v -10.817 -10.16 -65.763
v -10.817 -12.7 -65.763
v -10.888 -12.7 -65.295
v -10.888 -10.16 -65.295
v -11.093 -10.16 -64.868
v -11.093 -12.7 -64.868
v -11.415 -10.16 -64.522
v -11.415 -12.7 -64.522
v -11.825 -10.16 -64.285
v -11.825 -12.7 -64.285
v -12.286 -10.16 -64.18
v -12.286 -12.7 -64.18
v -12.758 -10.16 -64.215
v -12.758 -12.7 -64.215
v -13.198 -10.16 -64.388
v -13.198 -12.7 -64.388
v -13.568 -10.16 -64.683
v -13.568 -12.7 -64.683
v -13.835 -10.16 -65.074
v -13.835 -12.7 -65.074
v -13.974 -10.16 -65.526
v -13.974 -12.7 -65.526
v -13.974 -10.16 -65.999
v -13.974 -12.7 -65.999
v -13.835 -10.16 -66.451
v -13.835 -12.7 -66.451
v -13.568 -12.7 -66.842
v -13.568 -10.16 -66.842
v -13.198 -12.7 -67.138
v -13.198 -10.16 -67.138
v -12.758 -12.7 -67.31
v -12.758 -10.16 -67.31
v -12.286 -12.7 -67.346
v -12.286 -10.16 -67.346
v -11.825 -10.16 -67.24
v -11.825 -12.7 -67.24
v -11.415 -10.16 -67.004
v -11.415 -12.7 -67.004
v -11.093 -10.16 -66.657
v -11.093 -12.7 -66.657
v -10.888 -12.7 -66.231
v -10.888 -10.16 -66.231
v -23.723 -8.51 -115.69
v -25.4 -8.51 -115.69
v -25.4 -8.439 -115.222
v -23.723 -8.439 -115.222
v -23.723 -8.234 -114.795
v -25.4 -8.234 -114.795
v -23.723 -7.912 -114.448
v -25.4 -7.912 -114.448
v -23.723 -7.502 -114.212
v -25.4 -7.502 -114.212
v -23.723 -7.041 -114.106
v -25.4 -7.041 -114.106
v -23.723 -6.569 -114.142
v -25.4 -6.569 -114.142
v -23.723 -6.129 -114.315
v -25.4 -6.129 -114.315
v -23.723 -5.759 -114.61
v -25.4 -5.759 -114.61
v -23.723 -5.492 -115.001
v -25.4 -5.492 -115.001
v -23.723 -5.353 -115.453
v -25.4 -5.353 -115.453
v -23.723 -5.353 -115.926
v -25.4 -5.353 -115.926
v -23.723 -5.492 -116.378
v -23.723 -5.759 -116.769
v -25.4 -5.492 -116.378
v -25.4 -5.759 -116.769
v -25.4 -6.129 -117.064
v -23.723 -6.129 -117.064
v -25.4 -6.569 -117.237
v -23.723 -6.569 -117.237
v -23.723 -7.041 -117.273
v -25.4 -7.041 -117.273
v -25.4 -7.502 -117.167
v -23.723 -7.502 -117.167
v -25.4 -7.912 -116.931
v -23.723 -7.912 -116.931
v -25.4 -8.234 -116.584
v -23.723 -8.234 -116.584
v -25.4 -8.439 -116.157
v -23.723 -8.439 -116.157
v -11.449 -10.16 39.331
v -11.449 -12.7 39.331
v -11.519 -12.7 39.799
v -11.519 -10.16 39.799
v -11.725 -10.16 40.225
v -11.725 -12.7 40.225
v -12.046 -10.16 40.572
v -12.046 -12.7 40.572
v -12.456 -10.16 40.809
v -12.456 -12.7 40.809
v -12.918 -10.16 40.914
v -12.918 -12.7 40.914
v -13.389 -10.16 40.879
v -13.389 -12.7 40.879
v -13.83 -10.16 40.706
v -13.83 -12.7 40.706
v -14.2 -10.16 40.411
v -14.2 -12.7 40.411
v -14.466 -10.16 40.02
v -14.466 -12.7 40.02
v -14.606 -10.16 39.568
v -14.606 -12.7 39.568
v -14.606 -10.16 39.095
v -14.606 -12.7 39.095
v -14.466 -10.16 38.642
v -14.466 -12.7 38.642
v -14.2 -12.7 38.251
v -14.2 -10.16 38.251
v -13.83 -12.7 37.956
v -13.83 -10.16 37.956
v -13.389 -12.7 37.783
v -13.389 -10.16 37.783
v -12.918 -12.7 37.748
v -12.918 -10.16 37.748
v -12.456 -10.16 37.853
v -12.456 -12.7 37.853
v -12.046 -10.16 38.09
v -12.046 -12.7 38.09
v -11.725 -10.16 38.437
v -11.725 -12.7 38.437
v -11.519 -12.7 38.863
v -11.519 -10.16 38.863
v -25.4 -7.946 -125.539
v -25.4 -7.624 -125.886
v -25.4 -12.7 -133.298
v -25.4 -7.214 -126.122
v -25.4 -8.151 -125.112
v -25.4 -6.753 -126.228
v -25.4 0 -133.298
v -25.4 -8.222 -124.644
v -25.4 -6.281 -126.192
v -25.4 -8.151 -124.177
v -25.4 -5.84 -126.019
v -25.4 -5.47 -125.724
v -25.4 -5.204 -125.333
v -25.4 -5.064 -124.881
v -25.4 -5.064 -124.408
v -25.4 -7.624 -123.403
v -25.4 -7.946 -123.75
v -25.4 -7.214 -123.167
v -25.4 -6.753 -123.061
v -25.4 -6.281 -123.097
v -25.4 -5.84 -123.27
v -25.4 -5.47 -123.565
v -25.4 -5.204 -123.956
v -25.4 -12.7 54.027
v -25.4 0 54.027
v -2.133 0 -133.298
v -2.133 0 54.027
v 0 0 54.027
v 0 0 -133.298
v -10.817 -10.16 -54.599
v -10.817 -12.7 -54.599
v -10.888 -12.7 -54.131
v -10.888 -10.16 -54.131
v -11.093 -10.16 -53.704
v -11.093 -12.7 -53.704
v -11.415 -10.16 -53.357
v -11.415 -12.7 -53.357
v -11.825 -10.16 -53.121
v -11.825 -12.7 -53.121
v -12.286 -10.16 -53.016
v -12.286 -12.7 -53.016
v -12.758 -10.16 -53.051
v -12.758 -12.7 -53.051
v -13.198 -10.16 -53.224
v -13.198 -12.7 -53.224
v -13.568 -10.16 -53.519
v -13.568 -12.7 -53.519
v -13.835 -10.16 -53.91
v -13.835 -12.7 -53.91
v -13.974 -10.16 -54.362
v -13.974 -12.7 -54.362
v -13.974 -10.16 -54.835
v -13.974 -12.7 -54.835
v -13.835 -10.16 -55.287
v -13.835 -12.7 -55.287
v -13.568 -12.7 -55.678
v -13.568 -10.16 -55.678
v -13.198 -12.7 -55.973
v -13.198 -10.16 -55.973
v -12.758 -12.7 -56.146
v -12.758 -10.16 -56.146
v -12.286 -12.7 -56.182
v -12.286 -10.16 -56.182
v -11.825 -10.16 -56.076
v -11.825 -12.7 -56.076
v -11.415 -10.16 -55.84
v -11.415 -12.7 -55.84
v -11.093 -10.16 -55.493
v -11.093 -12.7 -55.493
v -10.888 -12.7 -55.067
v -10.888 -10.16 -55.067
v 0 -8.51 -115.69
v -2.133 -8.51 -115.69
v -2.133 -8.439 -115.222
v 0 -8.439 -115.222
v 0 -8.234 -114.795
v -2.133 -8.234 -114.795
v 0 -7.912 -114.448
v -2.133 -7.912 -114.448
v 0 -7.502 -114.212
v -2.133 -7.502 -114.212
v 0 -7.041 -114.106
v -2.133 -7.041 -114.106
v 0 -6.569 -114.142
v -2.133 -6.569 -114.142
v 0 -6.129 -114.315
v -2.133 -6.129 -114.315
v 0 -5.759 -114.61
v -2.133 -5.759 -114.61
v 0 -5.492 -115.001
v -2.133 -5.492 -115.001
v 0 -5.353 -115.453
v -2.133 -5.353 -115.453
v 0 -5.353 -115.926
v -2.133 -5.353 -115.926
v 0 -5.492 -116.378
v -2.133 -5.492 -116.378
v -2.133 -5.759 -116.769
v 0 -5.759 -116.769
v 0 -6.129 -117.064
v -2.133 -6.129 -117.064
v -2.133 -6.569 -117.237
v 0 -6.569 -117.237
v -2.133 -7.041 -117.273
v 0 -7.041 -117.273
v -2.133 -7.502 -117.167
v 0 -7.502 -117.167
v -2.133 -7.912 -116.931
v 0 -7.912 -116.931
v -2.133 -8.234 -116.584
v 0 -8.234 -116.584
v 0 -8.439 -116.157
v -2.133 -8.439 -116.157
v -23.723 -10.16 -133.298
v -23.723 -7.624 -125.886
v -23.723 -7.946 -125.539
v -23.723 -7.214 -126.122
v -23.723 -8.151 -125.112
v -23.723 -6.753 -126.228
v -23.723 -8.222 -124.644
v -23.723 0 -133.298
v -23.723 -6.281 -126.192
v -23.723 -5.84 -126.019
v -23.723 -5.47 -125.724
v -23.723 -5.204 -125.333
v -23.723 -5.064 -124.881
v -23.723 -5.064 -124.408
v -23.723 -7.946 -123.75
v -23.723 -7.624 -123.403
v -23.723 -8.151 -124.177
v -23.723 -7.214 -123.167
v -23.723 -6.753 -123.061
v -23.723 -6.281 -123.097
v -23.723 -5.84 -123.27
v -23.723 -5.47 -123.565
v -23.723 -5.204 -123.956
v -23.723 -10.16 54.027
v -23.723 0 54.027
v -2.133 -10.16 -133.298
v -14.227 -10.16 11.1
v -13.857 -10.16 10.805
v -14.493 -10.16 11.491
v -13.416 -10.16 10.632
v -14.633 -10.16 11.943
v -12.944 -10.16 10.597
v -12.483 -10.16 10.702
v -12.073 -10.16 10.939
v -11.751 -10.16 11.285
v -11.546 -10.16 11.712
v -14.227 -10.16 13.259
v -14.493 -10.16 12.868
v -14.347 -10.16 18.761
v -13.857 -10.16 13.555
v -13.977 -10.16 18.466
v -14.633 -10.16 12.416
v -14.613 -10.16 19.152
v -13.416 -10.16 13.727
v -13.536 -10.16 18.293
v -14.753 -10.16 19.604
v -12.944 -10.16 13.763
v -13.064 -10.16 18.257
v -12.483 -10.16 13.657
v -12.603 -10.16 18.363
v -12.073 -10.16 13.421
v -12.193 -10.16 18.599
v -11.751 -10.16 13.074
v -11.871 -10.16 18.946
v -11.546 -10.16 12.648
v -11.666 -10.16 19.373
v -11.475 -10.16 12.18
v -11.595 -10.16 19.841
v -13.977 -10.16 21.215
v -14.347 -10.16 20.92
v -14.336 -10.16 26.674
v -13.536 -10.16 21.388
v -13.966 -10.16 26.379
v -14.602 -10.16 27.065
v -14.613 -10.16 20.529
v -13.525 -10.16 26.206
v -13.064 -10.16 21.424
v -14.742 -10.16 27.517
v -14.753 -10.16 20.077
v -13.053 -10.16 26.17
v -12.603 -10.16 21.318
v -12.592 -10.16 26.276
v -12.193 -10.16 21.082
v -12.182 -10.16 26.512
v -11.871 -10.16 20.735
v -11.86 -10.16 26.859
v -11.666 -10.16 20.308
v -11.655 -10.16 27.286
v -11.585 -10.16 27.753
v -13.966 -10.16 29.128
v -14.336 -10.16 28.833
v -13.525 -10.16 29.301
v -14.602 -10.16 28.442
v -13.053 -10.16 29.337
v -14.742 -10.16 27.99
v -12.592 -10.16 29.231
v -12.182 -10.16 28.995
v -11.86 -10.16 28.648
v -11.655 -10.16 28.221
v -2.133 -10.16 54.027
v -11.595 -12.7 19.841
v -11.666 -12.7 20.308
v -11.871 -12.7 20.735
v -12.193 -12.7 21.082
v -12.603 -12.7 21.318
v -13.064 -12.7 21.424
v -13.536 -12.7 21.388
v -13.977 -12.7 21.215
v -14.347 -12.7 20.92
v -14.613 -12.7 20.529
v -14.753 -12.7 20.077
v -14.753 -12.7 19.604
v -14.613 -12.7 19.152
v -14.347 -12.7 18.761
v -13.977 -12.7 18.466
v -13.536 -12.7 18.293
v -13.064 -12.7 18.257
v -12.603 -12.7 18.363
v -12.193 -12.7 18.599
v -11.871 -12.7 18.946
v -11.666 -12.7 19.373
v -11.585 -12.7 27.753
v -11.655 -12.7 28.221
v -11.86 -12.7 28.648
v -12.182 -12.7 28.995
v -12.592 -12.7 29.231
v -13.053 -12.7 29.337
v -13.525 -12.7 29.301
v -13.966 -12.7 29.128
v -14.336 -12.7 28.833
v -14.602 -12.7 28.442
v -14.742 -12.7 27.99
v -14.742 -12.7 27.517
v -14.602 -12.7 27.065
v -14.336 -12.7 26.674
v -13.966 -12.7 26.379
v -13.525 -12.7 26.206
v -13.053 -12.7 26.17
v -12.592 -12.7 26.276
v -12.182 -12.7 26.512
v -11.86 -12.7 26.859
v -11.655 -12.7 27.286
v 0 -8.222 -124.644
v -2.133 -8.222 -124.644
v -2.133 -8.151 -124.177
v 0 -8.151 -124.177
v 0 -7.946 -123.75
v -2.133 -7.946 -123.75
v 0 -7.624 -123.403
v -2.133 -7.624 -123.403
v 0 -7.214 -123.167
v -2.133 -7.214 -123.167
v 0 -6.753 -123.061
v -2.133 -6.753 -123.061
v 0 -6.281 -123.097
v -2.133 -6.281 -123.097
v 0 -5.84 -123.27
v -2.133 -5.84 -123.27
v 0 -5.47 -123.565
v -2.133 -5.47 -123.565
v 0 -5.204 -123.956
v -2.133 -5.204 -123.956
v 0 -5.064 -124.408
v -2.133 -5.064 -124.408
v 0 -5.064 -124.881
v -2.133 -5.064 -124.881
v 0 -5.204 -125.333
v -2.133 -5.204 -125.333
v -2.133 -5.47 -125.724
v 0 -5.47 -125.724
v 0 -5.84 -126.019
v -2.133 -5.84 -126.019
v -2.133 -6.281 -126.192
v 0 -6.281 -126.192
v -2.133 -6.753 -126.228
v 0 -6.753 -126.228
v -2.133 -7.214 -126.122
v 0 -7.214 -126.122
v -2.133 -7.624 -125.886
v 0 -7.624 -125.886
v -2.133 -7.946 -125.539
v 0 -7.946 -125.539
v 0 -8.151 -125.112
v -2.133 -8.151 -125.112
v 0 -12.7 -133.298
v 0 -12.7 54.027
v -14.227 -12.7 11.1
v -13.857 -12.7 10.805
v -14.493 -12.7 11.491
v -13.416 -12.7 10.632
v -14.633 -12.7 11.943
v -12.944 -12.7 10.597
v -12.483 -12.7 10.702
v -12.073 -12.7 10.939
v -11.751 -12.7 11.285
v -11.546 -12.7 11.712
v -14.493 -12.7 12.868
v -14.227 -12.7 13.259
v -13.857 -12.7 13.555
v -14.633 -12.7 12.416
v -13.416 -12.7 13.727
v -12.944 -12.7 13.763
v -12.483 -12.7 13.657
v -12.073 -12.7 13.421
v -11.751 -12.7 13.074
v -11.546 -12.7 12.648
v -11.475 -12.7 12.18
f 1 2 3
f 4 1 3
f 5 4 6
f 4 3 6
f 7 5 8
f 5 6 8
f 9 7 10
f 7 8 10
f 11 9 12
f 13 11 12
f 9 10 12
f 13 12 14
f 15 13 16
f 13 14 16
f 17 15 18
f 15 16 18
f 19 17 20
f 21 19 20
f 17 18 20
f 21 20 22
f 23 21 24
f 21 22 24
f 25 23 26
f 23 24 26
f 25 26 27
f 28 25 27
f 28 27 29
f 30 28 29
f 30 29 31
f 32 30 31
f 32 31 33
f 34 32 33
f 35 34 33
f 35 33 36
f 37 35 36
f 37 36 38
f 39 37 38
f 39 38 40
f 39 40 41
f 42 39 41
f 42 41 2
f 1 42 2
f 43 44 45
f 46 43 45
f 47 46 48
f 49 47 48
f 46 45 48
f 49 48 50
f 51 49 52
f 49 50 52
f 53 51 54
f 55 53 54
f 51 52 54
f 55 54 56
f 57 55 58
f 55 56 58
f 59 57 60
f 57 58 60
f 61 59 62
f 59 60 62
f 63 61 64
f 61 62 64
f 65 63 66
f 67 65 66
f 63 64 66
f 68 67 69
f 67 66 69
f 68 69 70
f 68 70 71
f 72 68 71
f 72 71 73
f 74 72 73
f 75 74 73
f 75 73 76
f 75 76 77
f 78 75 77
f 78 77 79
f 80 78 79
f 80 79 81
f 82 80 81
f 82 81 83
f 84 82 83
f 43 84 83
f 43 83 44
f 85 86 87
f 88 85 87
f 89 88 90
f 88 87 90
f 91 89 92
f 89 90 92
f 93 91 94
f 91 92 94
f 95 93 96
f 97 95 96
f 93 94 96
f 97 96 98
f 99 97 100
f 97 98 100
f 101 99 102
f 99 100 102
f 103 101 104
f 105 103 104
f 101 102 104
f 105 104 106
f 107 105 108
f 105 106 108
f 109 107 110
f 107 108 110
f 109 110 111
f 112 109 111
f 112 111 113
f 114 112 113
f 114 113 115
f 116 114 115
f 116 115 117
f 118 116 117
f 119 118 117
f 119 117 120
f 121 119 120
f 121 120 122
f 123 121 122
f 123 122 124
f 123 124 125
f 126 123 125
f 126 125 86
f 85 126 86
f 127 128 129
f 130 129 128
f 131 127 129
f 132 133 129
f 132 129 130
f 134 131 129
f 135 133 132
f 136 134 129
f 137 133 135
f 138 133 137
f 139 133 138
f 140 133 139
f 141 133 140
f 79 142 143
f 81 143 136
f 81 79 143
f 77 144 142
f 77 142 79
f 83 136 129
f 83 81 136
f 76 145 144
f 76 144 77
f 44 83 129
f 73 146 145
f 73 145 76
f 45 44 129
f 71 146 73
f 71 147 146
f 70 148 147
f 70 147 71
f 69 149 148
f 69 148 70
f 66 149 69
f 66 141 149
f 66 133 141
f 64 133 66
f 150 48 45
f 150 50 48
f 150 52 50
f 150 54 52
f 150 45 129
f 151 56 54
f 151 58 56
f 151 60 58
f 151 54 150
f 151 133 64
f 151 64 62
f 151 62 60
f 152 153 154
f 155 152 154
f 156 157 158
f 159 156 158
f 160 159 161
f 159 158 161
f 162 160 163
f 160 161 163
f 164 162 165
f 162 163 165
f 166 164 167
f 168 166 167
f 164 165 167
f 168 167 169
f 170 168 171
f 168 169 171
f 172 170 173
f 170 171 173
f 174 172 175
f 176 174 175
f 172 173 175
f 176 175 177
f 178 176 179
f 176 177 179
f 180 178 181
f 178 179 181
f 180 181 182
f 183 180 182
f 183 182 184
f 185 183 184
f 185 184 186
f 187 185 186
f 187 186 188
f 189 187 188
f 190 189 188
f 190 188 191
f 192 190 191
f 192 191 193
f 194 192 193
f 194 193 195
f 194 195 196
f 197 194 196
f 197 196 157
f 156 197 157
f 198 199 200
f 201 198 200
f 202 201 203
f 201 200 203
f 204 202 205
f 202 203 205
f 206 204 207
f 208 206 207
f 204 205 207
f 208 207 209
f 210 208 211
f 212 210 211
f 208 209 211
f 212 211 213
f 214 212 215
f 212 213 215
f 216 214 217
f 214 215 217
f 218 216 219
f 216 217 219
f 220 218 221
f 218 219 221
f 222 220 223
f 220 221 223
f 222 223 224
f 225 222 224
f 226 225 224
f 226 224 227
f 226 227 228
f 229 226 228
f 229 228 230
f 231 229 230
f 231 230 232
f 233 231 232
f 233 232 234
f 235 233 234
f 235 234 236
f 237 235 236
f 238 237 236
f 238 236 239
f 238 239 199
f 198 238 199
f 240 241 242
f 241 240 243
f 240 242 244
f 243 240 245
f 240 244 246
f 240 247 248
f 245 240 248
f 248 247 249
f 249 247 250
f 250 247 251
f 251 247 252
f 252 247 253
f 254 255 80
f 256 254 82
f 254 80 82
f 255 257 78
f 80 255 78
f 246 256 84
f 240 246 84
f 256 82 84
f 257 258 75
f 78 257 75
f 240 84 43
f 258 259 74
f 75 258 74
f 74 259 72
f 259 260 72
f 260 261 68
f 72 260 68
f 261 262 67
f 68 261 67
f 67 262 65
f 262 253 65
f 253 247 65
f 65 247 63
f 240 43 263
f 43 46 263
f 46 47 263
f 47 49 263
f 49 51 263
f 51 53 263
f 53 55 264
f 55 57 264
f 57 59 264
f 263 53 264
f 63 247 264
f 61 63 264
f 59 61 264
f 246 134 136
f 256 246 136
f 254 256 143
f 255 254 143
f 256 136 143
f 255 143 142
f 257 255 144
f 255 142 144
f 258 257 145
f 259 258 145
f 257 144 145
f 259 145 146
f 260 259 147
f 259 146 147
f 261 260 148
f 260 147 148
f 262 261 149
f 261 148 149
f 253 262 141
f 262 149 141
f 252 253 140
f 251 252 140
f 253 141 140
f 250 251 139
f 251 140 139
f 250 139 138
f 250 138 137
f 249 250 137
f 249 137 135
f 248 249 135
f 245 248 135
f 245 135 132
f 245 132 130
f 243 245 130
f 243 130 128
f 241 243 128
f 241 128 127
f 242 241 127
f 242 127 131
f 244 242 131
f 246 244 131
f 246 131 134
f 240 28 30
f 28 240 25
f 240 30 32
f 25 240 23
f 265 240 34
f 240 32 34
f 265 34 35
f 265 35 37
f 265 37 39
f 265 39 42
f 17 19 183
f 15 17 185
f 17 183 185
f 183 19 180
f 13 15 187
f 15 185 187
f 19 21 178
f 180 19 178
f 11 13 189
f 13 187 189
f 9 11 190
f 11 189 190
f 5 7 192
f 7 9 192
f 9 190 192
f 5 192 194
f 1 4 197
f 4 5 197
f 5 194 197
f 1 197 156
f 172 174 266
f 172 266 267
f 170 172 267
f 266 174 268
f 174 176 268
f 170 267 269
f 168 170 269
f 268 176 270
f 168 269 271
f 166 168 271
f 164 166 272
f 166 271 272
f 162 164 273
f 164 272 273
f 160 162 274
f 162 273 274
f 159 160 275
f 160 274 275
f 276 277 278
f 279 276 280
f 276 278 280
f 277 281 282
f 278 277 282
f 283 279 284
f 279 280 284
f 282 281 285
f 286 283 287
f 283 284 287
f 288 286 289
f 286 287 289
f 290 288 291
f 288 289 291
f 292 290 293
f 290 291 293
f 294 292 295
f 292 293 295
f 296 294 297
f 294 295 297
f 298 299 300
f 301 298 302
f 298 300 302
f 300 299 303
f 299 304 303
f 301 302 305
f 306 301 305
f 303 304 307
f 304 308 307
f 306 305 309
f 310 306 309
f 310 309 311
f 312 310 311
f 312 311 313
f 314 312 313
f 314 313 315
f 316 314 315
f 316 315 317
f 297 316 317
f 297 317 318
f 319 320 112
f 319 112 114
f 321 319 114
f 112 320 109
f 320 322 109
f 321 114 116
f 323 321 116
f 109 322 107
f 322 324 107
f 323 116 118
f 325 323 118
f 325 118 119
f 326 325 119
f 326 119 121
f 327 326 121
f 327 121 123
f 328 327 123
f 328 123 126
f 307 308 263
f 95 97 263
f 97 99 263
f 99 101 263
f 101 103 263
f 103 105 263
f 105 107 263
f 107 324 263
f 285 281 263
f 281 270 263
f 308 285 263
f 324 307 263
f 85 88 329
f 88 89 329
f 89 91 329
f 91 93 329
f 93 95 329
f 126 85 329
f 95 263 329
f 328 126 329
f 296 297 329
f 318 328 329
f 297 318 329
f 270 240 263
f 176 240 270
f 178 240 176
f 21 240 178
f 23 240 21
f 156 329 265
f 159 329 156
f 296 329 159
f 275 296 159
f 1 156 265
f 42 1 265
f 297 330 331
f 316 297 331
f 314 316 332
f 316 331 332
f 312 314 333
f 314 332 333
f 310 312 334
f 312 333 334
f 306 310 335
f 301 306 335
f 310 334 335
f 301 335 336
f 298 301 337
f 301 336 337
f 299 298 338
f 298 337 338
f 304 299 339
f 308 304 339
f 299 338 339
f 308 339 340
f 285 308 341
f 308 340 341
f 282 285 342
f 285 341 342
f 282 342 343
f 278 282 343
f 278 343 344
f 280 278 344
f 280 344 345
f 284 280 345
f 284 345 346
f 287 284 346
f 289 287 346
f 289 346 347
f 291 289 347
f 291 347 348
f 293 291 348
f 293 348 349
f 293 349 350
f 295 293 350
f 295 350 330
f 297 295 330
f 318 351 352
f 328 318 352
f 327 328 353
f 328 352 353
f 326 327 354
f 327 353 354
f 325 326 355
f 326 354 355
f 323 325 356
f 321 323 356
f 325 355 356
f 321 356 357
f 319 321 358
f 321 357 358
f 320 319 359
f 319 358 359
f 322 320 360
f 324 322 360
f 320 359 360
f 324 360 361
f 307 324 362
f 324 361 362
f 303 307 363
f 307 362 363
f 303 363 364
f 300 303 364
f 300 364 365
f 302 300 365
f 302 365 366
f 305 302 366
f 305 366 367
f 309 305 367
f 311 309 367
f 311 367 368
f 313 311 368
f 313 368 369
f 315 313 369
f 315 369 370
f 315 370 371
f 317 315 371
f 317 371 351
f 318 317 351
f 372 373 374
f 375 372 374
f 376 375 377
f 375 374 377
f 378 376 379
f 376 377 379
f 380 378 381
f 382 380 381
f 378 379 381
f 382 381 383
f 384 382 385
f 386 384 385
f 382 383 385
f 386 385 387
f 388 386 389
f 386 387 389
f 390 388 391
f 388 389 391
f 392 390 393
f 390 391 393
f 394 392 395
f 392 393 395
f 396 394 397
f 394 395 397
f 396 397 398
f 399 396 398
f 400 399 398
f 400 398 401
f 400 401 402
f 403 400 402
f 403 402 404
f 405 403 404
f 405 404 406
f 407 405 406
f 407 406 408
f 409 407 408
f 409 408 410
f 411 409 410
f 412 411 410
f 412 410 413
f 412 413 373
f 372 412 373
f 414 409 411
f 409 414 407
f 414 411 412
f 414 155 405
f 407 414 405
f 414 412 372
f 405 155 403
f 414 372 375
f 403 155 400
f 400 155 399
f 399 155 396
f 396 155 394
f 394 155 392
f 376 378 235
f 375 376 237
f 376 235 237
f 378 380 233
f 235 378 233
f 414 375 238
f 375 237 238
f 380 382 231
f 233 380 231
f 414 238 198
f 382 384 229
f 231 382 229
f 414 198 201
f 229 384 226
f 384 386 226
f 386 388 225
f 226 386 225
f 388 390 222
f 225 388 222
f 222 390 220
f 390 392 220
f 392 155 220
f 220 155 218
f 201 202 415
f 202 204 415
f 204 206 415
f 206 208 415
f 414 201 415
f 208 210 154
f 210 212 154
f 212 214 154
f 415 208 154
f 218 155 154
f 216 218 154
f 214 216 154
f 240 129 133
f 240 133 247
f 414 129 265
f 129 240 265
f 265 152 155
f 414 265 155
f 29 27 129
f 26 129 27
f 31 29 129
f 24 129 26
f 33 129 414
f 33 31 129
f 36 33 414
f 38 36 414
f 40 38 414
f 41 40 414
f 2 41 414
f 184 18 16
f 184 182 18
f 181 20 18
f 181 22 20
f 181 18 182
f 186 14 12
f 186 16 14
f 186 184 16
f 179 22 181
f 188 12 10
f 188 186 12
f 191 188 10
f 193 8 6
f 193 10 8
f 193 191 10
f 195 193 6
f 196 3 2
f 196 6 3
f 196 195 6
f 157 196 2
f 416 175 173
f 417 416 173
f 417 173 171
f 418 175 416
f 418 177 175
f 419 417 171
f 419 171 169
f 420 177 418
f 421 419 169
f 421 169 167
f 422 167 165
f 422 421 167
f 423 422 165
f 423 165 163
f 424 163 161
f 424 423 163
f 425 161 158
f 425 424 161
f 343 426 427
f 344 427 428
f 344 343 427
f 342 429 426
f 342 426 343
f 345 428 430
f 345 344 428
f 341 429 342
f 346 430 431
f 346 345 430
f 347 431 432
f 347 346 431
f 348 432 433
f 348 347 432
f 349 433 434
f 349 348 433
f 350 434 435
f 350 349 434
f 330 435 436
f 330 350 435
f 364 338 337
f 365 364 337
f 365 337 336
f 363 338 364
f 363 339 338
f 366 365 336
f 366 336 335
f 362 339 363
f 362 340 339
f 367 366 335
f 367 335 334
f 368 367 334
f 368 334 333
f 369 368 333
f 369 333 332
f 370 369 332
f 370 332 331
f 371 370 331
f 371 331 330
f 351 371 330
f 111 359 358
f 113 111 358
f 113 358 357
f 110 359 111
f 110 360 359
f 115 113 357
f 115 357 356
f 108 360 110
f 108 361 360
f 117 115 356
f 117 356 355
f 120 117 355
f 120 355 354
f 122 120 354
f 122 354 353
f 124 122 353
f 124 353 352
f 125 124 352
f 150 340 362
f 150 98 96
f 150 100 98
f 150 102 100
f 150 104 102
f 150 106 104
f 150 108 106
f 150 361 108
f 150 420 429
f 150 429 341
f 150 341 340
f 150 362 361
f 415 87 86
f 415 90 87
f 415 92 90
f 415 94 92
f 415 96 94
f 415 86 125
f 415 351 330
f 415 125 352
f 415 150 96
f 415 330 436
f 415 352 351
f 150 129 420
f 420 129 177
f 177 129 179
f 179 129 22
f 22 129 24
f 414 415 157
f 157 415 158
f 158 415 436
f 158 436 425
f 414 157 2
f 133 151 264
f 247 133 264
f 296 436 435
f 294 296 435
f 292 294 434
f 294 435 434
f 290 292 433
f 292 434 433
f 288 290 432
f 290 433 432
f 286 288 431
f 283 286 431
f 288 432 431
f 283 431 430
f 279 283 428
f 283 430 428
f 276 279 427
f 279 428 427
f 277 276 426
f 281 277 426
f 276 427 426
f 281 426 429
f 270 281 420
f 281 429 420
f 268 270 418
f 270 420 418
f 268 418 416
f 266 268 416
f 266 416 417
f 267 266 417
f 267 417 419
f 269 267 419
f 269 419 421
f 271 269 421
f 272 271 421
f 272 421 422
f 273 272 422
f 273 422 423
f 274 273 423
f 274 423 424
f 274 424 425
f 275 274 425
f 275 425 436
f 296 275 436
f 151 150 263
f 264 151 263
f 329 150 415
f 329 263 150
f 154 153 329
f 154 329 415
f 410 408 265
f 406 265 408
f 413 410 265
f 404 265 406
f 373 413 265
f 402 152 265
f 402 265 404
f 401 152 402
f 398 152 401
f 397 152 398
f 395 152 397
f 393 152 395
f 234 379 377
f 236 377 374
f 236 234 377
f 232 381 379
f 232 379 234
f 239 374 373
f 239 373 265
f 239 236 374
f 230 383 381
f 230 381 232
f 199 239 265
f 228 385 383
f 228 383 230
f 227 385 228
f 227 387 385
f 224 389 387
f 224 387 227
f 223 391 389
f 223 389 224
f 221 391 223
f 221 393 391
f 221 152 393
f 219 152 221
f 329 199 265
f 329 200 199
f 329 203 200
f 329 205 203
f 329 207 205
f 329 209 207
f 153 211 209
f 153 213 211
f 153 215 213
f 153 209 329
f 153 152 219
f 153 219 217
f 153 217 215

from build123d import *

# Parameters (mm, degrees)
F0_W     = 25.4
F0_H     = 187.325
F1_DEPTH = 12.7
F2_W     = 21.59
F2_H     = 203.2
F3_DEPTH = 10.16
F5_D     = 3.175
F7_D     = 3.175
F9_D     = 3.175
F11_D    = 3.175
F13_D    = 3.175
F15_D    = 3.175
F17_D    = 3.175
F19_D    = 3.175


with BuildPart() as f1:
    # F0 (on Front) → F1 (new body)
    with BuildSketch(Plane.XZ):
        with Locations((-12.7, -39.635856)):
            Rectangle(F0_W, F0_H)
    extrude(amount=F1_DEPTH)

    # F2 (on Front) → F3 (cut)
    with BuildSketch(Plane.XZ):
        with Locations((-12.927838, -40.12759)):
            Rectangle(F2_W, F2_H)
    extrude(amount=F3_DEPTH, mode=Mode.SUBTRACT)

    # F5 (through all)
    with Locations(Plane.YZ):
        with Locations((-6.634117, -124.644481)):
            Hole(F5_D / 2)

    # F7 (through all)
    with Locations(Plane.YZ):
        with Locations((-6.922298, -115.689509)):
            Hole(F7_D / 2)

    # F9 (through all)
    with Locations(Plane(origin=(0, -10.16, 0), x_dir=(-1, 0, 0), z_dir=(0, 1, 0))):
        with Locations((13.036209, 39.331164)):
            Hole(F9_D / 2)

    # F11 (through all)
    with Locations(Plane(origin=(0, -10.16, 0), x_dir=(-1, 0, 0), z_dir=(0, 1, 0))):
        with Locations((13.172005, 27.753444)):
            Hole(F11_D / 2)

    # F13 (through all)
    with Locations(Plane(origin=(0, -10.16, 0), x_dir=(-1, 0, 0), z_dir=(0, 1, 0))):
        with Locations((13.182849, 19.840507)):
            Hole(F13_D / 2)

    # F15 (through all)
    with Locations(Plane(origin=(0, -10.16, 0), x_dir=(-1, 0, 0), z_dir=(0, 1, 0))):
        with Locations((13.062824, 12.179698)):
            Hole(F15_D / 2)

    # F17 (through all)
    with Locations(Plane(origin=(0, -10.16, 0), x_dir=(-1, 0, 0), z_dir=(0, 1, 0))):
        with Locations((12.404508, -54.598644)):
            Hole(F17_D / 2)

    # F19 (through all)
    with Locations(Plane(origin=(0, -10.16, 0), x_dir=(-1, 0, 0), z_dir=(0, 1, 0))):
        with Locations((12.404508, -65.762699)):
            Hole(F19_D / 2)


solid = f1.part
